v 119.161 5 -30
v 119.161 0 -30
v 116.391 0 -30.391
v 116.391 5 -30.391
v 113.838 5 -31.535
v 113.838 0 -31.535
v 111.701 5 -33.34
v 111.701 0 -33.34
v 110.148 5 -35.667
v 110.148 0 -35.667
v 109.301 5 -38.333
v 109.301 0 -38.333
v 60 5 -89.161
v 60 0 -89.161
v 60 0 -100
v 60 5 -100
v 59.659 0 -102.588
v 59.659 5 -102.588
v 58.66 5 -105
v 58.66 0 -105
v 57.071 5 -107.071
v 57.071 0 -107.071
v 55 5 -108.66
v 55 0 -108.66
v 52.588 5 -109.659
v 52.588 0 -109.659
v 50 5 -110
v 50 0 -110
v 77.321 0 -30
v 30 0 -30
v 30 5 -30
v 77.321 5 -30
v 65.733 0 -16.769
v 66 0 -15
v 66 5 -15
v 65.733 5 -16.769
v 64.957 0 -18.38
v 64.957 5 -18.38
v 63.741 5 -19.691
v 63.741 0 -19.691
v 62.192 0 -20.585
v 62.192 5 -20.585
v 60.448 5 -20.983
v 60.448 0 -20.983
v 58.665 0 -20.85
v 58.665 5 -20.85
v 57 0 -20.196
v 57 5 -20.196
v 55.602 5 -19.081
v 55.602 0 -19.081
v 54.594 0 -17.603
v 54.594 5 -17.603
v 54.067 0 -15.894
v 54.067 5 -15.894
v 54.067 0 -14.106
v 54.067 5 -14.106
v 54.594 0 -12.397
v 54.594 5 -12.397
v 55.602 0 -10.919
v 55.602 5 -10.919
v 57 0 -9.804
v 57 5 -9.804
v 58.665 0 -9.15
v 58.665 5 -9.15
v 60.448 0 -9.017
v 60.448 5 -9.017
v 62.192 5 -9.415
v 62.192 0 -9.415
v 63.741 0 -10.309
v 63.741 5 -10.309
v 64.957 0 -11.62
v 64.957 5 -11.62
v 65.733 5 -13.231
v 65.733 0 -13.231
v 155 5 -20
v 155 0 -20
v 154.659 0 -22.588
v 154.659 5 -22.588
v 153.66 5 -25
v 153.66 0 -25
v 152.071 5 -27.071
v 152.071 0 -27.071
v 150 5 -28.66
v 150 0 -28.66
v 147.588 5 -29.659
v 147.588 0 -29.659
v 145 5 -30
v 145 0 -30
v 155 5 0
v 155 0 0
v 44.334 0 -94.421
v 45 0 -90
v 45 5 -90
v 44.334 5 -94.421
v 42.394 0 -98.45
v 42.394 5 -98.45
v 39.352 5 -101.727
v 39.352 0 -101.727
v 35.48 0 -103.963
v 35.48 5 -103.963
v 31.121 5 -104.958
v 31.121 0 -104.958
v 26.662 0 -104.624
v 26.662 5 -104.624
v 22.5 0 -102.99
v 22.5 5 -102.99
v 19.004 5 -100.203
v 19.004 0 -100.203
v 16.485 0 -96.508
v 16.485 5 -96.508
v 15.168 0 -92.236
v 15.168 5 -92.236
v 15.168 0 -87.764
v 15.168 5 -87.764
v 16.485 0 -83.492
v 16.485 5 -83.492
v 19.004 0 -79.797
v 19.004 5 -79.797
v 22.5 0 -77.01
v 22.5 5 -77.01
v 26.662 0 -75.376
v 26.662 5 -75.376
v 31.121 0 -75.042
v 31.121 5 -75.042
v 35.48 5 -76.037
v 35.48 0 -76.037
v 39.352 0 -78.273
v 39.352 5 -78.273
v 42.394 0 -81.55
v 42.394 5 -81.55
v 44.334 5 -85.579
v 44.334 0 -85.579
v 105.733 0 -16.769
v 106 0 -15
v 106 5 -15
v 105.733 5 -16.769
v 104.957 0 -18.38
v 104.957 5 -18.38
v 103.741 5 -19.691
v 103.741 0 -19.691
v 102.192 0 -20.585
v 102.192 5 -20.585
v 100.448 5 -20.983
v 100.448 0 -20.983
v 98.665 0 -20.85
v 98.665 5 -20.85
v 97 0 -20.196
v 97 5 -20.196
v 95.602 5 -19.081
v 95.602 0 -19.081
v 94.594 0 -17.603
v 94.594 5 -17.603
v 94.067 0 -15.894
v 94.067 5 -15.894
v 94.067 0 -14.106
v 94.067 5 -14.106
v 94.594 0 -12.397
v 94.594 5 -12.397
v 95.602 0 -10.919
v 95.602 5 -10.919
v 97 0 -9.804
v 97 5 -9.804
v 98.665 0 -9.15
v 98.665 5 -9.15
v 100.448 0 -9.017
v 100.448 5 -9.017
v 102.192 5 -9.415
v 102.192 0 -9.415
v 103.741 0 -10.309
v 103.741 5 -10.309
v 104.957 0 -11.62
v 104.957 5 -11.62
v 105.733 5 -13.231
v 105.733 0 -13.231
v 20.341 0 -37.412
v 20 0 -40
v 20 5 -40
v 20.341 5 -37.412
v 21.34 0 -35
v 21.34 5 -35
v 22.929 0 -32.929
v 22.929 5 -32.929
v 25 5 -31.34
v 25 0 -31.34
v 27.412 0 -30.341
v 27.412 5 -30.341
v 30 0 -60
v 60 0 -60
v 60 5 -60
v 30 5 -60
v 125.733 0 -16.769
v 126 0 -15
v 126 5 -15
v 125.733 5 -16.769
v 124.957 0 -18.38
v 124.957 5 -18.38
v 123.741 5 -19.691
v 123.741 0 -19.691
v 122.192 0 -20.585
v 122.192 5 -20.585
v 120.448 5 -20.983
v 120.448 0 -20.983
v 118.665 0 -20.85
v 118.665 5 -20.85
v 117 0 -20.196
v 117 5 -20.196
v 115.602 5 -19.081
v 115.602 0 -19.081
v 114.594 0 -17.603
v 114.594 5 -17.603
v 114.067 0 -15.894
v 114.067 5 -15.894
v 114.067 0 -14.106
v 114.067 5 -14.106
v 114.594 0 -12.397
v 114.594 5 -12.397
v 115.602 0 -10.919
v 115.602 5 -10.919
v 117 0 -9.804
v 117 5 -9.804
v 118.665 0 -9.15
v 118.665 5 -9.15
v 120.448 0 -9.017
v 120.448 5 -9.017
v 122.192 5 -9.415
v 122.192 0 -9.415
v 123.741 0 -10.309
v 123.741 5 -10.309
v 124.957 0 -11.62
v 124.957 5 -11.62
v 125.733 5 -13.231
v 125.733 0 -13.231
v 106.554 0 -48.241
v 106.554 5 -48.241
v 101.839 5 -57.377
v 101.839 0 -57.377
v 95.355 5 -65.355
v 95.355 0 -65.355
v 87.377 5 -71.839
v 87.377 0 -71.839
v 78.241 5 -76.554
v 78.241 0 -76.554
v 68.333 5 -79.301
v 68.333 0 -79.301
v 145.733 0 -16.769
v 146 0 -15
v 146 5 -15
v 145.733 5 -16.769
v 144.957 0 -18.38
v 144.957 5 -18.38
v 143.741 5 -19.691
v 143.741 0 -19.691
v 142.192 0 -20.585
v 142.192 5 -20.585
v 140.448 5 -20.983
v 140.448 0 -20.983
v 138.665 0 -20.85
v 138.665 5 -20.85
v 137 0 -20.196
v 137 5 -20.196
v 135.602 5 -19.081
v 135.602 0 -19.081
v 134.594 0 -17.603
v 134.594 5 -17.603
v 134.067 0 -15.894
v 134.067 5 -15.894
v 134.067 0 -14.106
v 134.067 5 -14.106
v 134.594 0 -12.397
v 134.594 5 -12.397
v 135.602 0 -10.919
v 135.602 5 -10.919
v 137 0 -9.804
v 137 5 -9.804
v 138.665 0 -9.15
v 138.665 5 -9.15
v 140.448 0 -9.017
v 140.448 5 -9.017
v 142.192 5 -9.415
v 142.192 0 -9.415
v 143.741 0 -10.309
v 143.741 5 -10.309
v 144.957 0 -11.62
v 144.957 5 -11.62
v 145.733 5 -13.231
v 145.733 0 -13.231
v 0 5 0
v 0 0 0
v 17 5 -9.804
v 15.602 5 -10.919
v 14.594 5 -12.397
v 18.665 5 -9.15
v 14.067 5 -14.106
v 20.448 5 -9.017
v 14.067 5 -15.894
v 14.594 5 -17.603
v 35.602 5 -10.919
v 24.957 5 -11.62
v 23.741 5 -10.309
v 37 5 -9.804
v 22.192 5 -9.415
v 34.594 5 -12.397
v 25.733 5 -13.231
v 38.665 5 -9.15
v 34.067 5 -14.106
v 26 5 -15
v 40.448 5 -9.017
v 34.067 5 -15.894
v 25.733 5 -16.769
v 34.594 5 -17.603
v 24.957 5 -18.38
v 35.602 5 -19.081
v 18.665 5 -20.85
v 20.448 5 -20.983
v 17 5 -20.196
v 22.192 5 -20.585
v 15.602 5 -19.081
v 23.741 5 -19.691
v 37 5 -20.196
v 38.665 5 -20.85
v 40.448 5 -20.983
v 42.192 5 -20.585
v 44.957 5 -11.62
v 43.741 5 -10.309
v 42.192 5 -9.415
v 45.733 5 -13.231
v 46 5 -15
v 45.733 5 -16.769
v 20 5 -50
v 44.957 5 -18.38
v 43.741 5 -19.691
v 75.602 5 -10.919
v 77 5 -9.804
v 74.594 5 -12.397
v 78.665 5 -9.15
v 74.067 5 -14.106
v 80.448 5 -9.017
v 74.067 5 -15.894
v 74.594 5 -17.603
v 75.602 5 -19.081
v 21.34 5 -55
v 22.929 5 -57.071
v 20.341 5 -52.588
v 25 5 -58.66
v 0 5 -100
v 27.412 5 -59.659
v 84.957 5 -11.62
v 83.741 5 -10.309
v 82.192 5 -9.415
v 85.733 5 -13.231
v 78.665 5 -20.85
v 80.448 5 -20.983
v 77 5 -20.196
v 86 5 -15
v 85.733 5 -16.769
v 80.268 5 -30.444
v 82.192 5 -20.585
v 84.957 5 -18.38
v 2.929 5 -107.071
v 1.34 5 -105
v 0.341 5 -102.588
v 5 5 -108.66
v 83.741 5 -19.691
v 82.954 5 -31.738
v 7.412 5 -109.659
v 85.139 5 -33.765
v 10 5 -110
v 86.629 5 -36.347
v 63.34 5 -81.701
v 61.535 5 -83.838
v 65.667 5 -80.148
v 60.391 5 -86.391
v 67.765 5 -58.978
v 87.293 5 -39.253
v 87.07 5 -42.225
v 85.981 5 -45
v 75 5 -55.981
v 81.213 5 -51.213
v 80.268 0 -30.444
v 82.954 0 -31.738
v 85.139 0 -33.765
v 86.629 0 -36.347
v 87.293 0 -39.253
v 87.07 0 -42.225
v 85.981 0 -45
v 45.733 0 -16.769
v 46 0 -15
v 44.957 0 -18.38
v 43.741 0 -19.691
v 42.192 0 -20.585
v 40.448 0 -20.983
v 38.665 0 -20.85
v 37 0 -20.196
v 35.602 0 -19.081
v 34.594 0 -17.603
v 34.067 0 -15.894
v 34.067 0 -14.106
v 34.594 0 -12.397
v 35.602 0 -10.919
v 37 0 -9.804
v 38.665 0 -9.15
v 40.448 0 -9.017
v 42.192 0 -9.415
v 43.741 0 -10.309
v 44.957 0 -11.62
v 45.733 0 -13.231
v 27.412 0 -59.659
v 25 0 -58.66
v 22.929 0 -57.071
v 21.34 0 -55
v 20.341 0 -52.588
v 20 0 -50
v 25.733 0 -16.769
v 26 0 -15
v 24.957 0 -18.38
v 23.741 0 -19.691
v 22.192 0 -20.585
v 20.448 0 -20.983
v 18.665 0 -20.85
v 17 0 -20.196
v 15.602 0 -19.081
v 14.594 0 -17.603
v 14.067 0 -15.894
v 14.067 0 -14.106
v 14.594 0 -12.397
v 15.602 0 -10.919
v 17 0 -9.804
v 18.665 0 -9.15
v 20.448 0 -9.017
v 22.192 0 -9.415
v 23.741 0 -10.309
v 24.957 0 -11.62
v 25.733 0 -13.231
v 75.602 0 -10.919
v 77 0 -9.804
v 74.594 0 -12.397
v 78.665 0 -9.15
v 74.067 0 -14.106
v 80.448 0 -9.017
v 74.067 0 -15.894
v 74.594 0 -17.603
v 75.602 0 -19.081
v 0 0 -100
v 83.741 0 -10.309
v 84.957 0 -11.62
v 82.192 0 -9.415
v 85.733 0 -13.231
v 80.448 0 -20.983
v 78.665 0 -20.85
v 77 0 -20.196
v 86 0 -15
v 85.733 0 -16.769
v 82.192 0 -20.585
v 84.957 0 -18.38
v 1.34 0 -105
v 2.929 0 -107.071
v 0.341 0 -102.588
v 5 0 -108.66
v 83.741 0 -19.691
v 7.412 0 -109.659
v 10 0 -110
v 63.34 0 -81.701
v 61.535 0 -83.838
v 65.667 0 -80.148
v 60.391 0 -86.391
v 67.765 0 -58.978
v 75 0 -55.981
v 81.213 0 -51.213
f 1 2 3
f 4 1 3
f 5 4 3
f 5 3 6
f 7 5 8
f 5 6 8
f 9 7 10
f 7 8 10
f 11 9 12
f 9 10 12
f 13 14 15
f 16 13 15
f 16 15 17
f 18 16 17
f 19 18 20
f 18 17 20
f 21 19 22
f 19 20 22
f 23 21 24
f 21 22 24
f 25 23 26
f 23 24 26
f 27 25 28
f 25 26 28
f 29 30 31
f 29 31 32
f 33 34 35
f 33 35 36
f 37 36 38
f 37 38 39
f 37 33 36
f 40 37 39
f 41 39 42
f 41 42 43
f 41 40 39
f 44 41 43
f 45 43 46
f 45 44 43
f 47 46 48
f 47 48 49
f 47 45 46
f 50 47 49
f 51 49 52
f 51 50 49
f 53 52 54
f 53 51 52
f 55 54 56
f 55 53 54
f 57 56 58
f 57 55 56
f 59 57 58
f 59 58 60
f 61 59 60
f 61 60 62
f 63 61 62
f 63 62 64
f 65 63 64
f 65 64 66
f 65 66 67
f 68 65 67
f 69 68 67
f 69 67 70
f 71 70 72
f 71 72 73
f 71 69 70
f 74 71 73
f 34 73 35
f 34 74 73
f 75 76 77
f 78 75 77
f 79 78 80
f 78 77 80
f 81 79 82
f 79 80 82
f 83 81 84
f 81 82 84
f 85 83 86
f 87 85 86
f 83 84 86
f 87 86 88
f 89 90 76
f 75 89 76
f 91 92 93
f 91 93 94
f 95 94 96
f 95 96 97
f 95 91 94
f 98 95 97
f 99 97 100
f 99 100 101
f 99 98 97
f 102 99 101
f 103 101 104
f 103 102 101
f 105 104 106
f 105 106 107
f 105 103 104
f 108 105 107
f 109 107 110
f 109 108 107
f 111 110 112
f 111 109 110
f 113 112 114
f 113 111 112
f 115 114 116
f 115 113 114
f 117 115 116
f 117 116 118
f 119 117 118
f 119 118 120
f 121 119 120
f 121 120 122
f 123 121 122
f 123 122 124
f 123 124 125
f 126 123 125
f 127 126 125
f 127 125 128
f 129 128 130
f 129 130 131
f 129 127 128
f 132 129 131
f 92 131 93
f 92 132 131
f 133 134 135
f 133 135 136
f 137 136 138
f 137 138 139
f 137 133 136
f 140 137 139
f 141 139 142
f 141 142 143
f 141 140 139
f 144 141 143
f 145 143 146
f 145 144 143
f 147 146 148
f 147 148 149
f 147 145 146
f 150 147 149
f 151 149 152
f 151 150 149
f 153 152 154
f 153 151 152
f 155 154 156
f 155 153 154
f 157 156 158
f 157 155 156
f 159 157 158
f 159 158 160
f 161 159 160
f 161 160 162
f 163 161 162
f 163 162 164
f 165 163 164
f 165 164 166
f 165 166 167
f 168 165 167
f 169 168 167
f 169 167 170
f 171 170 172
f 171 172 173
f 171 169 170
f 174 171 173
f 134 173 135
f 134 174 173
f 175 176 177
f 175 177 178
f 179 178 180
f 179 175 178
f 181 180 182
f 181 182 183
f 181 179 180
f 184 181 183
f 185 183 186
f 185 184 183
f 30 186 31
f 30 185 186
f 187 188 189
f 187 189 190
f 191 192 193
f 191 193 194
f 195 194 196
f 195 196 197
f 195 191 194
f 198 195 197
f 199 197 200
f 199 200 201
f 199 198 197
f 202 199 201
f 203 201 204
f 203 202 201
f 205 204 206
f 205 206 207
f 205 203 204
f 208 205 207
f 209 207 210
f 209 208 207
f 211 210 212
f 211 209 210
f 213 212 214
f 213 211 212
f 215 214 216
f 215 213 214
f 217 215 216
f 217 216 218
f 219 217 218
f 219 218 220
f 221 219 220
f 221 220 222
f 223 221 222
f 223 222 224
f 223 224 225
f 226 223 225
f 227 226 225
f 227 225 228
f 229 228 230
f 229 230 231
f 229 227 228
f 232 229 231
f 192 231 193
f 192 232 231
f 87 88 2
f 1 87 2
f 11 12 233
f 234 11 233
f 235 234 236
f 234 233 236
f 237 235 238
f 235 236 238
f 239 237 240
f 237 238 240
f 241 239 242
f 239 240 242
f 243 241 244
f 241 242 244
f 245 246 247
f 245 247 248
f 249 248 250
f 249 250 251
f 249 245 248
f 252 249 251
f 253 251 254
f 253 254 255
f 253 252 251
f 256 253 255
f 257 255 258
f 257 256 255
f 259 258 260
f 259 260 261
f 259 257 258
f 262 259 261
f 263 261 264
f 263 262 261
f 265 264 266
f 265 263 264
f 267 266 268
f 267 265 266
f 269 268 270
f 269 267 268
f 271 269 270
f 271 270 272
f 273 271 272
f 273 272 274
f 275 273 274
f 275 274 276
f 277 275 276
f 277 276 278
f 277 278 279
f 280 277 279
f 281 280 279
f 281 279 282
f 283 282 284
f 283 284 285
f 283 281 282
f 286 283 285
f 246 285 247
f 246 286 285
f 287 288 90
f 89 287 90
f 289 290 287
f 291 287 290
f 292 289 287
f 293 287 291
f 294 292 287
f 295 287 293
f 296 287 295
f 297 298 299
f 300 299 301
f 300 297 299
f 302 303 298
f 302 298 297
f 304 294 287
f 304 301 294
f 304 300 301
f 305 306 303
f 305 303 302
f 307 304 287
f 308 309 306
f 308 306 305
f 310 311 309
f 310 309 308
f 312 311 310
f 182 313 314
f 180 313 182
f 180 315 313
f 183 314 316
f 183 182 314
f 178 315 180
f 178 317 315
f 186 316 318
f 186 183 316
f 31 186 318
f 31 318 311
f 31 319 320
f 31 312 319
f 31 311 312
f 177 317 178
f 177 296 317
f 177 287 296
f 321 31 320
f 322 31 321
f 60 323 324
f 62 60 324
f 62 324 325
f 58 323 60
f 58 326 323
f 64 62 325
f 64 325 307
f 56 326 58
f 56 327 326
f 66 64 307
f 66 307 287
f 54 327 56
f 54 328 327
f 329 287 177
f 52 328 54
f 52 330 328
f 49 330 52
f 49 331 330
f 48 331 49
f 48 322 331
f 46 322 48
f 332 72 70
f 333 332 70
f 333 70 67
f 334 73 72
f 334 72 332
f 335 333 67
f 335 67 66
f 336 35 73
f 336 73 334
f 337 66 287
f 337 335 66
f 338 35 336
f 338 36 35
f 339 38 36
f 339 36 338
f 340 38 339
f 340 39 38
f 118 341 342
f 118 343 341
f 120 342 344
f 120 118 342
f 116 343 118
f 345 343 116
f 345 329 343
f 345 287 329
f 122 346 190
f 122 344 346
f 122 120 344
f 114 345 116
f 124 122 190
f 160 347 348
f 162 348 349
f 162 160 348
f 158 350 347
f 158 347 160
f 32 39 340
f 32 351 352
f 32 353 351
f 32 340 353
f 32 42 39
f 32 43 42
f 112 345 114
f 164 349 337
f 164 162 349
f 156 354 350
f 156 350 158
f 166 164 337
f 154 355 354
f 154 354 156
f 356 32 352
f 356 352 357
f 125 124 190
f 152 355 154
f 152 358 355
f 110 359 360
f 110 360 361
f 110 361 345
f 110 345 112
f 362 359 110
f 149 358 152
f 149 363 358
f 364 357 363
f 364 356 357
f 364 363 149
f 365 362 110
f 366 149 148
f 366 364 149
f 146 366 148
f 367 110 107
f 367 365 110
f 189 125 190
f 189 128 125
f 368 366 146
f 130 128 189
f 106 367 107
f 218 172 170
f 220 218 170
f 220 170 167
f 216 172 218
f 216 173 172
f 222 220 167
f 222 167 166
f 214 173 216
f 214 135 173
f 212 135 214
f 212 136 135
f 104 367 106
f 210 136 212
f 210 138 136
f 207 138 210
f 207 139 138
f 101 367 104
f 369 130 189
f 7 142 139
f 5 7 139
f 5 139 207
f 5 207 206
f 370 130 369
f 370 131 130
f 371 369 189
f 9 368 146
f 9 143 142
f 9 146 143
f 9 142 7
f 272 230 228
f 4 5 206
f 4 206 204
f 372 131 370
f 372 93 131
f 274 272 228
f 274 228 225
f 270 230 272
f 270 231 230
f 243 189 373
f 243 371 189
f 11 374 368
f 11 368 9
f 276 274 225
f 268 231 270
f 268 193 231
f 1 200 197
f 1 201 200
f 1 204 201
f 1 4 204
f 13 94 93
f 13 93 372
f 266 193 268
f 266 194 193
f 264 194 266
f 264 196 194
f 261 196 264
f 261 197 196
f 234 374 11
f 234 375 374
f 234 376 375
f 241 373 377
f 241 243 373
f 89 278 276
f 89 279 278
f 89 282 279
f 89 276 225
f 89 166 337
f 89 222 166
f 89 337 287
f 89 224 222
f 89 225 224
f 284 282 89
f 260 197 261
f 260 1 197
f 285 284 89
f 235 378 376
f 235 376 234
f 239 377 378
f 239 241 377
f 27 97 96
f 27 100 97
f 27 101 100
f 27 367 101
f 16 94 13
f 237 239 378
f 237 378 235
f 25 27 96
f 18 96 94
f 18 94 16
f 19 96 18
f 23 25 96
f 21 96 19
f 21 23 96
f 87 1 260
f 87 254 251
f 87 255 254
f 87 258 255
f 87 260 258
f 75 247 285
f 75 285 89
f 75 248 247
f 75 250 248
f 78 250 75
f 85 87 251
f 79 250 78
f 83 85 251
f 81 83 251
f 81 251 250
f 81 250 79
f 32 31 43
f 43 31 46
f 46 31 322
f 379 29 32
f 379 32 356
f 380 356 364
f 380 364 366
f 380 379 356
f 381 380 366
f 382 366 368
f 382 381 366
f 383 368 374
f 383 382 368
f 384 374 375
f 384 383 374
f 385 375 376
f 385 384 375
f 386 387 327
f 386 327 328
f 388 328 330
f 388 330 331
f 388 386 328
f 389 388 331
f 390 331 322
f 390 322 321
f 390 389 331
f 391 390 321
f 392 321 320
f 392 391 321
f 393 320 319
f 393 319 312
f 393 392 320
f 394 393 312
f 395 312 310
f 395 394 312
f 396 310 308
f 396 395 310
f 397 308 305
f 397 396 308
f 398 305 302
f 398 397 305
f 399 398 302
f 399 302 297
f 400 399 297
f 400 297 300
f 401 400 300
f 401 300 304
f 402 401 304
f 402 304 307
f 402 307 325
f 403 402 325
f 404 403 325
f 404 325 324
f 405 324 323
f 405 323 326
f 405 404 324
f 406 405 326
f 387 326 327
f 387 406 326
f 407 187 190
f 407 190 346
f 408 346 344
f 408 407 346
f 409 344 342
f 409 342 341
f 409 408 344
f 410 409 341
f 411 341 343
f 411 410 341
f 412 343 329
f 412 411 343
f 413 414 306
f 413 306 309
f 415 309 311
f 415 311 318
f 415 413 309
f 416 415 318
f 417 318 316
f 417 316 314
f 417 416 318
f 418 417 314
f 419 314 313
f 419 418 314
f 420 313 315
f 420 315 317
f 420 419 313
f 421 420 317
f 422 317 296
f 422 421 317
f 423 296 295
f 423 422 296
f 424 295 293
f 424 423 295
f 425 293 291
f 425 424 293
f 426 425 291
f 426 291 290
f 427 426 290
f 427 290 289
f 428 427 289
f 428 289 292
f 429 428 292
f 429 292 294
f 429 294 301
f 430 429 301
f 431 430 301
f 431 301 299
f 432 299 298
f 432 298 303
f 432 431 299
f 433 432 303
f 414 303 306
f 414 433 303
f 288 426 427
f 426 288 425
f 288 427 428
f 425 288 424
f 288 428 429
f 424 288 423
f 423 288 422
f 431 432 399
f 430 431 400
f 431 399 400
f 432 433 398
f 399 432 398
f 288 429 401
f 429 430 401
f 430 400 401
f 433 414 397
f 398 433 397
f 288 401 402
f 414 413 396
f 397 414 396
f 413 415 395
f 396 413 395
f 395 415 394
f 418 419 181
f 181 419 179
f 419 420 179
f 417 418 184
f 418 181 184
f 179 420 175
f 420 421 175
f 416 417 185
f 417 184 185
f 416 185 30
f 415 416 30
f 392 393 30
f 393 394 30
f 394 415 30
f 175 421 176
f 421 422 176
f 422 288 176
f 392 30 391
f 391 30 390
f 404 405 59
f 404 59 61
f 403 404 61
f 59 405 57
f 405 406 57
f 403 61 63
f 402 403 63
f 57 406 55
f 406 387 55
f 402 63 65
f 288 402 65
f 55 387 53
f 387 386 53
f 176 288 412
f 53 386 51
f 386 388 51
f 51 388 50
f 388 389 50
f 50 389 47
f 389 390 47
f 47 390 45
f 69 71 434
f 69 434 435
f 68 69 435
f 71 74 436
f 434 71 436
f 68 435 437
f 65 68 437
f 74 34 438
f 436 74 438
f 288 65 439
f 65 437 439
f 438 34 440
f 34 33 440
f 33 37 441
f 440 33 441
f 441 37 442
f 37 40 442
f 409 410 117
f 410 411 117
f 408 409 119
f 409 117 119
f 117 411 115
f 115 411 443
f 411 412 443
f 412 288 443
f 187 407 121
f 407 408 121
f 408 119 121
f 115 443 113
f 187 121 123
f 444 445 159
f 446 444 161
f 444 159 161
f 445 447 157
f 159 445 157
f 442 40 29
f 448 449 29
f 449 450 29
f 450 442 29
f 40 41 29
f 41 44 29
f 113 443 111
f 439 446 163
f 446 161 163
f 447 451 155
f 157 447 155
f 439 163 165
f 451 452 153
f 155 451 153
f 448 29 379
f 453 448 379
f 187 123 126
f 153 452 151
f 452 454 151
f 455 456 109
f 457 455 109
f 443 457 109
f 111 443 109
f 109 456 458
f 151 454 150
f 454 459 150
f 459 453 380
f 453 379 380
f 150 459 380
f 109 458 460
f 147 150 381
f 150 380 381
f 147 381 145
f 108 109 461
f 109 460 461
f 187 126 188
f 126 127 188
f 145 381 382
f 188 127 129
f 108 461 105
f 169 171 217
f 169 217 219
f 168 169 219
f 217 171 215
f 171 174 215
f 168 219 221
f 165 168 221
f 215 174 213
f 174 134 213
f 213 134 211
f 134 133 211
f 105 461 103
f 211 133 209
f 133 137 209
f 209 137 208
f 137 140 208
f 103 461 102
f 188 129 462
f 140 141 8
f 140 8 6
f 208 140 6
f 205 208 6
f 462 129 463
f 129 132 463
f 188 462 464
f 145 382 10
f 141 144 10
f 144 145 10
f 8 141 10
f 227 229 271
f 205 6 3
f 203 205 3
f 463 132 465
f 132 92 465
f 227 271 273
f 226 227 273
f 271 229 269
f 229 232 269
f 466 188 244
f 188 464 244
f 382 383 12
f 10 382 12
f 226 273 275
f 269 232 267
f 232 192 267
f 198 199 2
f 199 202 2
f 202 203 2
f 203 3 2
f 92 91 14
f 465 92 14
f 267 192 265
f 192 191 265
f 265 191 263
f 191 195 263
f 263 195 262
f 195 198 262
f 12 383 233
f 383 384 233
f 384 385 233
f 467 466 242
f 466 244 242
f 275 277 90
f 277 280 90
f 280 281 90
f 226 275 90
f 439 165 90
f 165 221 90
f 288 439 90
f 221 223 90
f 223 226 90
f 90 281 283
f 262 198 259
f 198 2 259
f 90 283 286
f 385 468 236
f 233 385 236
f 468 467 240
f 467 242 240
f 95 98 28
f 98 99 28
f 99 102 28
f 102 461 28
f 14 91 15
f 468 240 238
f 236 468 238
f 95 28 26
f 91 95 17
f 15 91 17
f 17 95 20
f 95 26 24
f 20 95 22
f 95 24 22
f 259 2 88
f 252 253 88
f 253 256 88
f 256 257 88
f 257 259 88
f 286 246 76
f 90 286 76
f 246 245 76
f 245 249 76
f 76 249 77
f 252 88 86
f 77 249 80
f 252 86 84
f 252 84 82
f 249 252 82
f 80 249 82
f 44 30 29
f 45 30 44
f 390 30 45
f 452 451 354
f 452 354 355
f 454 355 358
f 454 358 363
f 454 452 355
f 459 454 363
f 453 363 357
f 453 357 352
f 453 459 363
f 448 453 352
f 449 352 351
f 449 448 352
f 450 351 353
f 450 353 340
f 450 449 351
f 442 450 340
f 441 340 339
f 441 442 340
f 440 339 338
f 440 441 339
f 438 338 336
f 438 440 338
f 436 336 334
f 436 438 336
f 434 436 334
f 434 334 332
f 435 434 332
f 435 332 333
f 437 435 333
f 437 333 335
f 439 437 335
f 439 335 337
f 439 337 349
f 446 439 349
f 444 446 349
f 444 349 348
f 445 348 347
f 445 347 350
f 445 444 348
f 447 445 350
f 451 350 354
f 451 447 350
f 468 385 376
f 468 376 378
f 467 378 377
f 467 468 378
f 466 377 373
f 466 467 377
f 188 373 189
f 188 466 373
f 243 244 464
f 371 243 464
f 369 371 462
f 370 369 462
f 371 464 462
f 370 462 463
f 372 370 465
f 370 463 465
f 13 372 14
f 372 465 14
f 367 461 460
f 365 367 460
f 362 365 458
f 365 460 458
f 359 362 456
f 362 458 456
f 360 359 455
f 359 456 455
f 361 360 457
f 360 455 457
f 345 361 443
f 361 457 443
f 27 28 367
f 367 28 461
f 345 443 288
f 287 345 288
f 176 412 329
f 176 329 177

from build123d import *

# Parameters (mm, degrees)
SKETCH1_R           = 6
SKETCH1_R_2         = 15
BOSS_EXTRUDE1_DEPTH = 5


with BuildPart() as part:
    # Sketch1 → Boss-Extrude1 (new body)
    with BuildSketch(Plane(origin=(0, 0, 0), x_dir=(1, 0, 0), z_dir=(0, 1, 0))):
        with BuildLine():
            Line((0, 0), (155, 0))
            Line((155, 0), (155, 20))
            ThreePointArc((155, 20), (152.071067812, 27.071067812), (145, 30))
            Line((145, 30), (119.160797831, 30))
            ThreePointArc((119.160797831, 30), (112.705825587, 32.362373842), (109.300664859, 38.333333333))
            ThreePointArc((109.300664859, 38.333333333), (95.355339059, 65.355339059), (68.333333333, 79.300664859))
            ThreePointArc((68.333333333, 79.300664859), (62.362373842, 82.705825587), (60, 89.160797831))
            Line((60, 89.160797831), (60, 100))
            ThreePointArc((60, 100), (57.071067812, 107.071067812), (50, 110))
            Line((50, 110), (10, 110))
            ThreePointArc((10, 110), (2.928932188, 107.071067812), (0, 100))
            Line((0, 100), (0, 0))
        make_face()
        with Locations((20, 15)):
            Circle(SKETCH1_R, mode=Mode.SUBTRACT)
        with Locations((40, 15)):
            Circle(SKETCH1_R, mode=Mode.SUBTRACT)
        with Locations((60, 15)):
            Circle(SKETCH1_R, mode=Mode.SUBTRACT)
        with Locations((80, 15)):
            Circle(SKETCH1_R, mode=Mode.SUBTRACT)
        with Locations((100, 15)):
            Circle(SKETCH1_R, mode=Mode.SUBTRACT)
        with Locations((120, 15)):
            Circle(SKETCH1_R, mode=Mode.SUBTRACT)
        with Locations((140, 15)):
            Circle(SKETCH1_R, mode=Mode.SUBTRACT)
        with Locations((30, 90)):
            Circle(SKETCH1_R_2, mode=Mode.SUBTRACT)
        with BuildLine():
            Line((60, 60), (30, 60))
            ThreePointArc((30, 60), (22.928932188, 57.071067812), (20, 50))
            Line((20, 50), (20, 40))
            ThreePointArc((20, 40), (22.928932188, 32.928932188), (30, 30))
            Line((30, 30), (77.320508076, 30))
            ThreePointArc((77.320508076, 30), (85.980762114, 35), (85.980762114, 45))
            ThreePointArc((85.980762114, 45), (75, 55.980762114), (60, 60))
        make_face(mode=Mode.SUBTRACT)
    extrude(amount=BOSS_EXTRUDE1_DEPTH)


solid = part.part
